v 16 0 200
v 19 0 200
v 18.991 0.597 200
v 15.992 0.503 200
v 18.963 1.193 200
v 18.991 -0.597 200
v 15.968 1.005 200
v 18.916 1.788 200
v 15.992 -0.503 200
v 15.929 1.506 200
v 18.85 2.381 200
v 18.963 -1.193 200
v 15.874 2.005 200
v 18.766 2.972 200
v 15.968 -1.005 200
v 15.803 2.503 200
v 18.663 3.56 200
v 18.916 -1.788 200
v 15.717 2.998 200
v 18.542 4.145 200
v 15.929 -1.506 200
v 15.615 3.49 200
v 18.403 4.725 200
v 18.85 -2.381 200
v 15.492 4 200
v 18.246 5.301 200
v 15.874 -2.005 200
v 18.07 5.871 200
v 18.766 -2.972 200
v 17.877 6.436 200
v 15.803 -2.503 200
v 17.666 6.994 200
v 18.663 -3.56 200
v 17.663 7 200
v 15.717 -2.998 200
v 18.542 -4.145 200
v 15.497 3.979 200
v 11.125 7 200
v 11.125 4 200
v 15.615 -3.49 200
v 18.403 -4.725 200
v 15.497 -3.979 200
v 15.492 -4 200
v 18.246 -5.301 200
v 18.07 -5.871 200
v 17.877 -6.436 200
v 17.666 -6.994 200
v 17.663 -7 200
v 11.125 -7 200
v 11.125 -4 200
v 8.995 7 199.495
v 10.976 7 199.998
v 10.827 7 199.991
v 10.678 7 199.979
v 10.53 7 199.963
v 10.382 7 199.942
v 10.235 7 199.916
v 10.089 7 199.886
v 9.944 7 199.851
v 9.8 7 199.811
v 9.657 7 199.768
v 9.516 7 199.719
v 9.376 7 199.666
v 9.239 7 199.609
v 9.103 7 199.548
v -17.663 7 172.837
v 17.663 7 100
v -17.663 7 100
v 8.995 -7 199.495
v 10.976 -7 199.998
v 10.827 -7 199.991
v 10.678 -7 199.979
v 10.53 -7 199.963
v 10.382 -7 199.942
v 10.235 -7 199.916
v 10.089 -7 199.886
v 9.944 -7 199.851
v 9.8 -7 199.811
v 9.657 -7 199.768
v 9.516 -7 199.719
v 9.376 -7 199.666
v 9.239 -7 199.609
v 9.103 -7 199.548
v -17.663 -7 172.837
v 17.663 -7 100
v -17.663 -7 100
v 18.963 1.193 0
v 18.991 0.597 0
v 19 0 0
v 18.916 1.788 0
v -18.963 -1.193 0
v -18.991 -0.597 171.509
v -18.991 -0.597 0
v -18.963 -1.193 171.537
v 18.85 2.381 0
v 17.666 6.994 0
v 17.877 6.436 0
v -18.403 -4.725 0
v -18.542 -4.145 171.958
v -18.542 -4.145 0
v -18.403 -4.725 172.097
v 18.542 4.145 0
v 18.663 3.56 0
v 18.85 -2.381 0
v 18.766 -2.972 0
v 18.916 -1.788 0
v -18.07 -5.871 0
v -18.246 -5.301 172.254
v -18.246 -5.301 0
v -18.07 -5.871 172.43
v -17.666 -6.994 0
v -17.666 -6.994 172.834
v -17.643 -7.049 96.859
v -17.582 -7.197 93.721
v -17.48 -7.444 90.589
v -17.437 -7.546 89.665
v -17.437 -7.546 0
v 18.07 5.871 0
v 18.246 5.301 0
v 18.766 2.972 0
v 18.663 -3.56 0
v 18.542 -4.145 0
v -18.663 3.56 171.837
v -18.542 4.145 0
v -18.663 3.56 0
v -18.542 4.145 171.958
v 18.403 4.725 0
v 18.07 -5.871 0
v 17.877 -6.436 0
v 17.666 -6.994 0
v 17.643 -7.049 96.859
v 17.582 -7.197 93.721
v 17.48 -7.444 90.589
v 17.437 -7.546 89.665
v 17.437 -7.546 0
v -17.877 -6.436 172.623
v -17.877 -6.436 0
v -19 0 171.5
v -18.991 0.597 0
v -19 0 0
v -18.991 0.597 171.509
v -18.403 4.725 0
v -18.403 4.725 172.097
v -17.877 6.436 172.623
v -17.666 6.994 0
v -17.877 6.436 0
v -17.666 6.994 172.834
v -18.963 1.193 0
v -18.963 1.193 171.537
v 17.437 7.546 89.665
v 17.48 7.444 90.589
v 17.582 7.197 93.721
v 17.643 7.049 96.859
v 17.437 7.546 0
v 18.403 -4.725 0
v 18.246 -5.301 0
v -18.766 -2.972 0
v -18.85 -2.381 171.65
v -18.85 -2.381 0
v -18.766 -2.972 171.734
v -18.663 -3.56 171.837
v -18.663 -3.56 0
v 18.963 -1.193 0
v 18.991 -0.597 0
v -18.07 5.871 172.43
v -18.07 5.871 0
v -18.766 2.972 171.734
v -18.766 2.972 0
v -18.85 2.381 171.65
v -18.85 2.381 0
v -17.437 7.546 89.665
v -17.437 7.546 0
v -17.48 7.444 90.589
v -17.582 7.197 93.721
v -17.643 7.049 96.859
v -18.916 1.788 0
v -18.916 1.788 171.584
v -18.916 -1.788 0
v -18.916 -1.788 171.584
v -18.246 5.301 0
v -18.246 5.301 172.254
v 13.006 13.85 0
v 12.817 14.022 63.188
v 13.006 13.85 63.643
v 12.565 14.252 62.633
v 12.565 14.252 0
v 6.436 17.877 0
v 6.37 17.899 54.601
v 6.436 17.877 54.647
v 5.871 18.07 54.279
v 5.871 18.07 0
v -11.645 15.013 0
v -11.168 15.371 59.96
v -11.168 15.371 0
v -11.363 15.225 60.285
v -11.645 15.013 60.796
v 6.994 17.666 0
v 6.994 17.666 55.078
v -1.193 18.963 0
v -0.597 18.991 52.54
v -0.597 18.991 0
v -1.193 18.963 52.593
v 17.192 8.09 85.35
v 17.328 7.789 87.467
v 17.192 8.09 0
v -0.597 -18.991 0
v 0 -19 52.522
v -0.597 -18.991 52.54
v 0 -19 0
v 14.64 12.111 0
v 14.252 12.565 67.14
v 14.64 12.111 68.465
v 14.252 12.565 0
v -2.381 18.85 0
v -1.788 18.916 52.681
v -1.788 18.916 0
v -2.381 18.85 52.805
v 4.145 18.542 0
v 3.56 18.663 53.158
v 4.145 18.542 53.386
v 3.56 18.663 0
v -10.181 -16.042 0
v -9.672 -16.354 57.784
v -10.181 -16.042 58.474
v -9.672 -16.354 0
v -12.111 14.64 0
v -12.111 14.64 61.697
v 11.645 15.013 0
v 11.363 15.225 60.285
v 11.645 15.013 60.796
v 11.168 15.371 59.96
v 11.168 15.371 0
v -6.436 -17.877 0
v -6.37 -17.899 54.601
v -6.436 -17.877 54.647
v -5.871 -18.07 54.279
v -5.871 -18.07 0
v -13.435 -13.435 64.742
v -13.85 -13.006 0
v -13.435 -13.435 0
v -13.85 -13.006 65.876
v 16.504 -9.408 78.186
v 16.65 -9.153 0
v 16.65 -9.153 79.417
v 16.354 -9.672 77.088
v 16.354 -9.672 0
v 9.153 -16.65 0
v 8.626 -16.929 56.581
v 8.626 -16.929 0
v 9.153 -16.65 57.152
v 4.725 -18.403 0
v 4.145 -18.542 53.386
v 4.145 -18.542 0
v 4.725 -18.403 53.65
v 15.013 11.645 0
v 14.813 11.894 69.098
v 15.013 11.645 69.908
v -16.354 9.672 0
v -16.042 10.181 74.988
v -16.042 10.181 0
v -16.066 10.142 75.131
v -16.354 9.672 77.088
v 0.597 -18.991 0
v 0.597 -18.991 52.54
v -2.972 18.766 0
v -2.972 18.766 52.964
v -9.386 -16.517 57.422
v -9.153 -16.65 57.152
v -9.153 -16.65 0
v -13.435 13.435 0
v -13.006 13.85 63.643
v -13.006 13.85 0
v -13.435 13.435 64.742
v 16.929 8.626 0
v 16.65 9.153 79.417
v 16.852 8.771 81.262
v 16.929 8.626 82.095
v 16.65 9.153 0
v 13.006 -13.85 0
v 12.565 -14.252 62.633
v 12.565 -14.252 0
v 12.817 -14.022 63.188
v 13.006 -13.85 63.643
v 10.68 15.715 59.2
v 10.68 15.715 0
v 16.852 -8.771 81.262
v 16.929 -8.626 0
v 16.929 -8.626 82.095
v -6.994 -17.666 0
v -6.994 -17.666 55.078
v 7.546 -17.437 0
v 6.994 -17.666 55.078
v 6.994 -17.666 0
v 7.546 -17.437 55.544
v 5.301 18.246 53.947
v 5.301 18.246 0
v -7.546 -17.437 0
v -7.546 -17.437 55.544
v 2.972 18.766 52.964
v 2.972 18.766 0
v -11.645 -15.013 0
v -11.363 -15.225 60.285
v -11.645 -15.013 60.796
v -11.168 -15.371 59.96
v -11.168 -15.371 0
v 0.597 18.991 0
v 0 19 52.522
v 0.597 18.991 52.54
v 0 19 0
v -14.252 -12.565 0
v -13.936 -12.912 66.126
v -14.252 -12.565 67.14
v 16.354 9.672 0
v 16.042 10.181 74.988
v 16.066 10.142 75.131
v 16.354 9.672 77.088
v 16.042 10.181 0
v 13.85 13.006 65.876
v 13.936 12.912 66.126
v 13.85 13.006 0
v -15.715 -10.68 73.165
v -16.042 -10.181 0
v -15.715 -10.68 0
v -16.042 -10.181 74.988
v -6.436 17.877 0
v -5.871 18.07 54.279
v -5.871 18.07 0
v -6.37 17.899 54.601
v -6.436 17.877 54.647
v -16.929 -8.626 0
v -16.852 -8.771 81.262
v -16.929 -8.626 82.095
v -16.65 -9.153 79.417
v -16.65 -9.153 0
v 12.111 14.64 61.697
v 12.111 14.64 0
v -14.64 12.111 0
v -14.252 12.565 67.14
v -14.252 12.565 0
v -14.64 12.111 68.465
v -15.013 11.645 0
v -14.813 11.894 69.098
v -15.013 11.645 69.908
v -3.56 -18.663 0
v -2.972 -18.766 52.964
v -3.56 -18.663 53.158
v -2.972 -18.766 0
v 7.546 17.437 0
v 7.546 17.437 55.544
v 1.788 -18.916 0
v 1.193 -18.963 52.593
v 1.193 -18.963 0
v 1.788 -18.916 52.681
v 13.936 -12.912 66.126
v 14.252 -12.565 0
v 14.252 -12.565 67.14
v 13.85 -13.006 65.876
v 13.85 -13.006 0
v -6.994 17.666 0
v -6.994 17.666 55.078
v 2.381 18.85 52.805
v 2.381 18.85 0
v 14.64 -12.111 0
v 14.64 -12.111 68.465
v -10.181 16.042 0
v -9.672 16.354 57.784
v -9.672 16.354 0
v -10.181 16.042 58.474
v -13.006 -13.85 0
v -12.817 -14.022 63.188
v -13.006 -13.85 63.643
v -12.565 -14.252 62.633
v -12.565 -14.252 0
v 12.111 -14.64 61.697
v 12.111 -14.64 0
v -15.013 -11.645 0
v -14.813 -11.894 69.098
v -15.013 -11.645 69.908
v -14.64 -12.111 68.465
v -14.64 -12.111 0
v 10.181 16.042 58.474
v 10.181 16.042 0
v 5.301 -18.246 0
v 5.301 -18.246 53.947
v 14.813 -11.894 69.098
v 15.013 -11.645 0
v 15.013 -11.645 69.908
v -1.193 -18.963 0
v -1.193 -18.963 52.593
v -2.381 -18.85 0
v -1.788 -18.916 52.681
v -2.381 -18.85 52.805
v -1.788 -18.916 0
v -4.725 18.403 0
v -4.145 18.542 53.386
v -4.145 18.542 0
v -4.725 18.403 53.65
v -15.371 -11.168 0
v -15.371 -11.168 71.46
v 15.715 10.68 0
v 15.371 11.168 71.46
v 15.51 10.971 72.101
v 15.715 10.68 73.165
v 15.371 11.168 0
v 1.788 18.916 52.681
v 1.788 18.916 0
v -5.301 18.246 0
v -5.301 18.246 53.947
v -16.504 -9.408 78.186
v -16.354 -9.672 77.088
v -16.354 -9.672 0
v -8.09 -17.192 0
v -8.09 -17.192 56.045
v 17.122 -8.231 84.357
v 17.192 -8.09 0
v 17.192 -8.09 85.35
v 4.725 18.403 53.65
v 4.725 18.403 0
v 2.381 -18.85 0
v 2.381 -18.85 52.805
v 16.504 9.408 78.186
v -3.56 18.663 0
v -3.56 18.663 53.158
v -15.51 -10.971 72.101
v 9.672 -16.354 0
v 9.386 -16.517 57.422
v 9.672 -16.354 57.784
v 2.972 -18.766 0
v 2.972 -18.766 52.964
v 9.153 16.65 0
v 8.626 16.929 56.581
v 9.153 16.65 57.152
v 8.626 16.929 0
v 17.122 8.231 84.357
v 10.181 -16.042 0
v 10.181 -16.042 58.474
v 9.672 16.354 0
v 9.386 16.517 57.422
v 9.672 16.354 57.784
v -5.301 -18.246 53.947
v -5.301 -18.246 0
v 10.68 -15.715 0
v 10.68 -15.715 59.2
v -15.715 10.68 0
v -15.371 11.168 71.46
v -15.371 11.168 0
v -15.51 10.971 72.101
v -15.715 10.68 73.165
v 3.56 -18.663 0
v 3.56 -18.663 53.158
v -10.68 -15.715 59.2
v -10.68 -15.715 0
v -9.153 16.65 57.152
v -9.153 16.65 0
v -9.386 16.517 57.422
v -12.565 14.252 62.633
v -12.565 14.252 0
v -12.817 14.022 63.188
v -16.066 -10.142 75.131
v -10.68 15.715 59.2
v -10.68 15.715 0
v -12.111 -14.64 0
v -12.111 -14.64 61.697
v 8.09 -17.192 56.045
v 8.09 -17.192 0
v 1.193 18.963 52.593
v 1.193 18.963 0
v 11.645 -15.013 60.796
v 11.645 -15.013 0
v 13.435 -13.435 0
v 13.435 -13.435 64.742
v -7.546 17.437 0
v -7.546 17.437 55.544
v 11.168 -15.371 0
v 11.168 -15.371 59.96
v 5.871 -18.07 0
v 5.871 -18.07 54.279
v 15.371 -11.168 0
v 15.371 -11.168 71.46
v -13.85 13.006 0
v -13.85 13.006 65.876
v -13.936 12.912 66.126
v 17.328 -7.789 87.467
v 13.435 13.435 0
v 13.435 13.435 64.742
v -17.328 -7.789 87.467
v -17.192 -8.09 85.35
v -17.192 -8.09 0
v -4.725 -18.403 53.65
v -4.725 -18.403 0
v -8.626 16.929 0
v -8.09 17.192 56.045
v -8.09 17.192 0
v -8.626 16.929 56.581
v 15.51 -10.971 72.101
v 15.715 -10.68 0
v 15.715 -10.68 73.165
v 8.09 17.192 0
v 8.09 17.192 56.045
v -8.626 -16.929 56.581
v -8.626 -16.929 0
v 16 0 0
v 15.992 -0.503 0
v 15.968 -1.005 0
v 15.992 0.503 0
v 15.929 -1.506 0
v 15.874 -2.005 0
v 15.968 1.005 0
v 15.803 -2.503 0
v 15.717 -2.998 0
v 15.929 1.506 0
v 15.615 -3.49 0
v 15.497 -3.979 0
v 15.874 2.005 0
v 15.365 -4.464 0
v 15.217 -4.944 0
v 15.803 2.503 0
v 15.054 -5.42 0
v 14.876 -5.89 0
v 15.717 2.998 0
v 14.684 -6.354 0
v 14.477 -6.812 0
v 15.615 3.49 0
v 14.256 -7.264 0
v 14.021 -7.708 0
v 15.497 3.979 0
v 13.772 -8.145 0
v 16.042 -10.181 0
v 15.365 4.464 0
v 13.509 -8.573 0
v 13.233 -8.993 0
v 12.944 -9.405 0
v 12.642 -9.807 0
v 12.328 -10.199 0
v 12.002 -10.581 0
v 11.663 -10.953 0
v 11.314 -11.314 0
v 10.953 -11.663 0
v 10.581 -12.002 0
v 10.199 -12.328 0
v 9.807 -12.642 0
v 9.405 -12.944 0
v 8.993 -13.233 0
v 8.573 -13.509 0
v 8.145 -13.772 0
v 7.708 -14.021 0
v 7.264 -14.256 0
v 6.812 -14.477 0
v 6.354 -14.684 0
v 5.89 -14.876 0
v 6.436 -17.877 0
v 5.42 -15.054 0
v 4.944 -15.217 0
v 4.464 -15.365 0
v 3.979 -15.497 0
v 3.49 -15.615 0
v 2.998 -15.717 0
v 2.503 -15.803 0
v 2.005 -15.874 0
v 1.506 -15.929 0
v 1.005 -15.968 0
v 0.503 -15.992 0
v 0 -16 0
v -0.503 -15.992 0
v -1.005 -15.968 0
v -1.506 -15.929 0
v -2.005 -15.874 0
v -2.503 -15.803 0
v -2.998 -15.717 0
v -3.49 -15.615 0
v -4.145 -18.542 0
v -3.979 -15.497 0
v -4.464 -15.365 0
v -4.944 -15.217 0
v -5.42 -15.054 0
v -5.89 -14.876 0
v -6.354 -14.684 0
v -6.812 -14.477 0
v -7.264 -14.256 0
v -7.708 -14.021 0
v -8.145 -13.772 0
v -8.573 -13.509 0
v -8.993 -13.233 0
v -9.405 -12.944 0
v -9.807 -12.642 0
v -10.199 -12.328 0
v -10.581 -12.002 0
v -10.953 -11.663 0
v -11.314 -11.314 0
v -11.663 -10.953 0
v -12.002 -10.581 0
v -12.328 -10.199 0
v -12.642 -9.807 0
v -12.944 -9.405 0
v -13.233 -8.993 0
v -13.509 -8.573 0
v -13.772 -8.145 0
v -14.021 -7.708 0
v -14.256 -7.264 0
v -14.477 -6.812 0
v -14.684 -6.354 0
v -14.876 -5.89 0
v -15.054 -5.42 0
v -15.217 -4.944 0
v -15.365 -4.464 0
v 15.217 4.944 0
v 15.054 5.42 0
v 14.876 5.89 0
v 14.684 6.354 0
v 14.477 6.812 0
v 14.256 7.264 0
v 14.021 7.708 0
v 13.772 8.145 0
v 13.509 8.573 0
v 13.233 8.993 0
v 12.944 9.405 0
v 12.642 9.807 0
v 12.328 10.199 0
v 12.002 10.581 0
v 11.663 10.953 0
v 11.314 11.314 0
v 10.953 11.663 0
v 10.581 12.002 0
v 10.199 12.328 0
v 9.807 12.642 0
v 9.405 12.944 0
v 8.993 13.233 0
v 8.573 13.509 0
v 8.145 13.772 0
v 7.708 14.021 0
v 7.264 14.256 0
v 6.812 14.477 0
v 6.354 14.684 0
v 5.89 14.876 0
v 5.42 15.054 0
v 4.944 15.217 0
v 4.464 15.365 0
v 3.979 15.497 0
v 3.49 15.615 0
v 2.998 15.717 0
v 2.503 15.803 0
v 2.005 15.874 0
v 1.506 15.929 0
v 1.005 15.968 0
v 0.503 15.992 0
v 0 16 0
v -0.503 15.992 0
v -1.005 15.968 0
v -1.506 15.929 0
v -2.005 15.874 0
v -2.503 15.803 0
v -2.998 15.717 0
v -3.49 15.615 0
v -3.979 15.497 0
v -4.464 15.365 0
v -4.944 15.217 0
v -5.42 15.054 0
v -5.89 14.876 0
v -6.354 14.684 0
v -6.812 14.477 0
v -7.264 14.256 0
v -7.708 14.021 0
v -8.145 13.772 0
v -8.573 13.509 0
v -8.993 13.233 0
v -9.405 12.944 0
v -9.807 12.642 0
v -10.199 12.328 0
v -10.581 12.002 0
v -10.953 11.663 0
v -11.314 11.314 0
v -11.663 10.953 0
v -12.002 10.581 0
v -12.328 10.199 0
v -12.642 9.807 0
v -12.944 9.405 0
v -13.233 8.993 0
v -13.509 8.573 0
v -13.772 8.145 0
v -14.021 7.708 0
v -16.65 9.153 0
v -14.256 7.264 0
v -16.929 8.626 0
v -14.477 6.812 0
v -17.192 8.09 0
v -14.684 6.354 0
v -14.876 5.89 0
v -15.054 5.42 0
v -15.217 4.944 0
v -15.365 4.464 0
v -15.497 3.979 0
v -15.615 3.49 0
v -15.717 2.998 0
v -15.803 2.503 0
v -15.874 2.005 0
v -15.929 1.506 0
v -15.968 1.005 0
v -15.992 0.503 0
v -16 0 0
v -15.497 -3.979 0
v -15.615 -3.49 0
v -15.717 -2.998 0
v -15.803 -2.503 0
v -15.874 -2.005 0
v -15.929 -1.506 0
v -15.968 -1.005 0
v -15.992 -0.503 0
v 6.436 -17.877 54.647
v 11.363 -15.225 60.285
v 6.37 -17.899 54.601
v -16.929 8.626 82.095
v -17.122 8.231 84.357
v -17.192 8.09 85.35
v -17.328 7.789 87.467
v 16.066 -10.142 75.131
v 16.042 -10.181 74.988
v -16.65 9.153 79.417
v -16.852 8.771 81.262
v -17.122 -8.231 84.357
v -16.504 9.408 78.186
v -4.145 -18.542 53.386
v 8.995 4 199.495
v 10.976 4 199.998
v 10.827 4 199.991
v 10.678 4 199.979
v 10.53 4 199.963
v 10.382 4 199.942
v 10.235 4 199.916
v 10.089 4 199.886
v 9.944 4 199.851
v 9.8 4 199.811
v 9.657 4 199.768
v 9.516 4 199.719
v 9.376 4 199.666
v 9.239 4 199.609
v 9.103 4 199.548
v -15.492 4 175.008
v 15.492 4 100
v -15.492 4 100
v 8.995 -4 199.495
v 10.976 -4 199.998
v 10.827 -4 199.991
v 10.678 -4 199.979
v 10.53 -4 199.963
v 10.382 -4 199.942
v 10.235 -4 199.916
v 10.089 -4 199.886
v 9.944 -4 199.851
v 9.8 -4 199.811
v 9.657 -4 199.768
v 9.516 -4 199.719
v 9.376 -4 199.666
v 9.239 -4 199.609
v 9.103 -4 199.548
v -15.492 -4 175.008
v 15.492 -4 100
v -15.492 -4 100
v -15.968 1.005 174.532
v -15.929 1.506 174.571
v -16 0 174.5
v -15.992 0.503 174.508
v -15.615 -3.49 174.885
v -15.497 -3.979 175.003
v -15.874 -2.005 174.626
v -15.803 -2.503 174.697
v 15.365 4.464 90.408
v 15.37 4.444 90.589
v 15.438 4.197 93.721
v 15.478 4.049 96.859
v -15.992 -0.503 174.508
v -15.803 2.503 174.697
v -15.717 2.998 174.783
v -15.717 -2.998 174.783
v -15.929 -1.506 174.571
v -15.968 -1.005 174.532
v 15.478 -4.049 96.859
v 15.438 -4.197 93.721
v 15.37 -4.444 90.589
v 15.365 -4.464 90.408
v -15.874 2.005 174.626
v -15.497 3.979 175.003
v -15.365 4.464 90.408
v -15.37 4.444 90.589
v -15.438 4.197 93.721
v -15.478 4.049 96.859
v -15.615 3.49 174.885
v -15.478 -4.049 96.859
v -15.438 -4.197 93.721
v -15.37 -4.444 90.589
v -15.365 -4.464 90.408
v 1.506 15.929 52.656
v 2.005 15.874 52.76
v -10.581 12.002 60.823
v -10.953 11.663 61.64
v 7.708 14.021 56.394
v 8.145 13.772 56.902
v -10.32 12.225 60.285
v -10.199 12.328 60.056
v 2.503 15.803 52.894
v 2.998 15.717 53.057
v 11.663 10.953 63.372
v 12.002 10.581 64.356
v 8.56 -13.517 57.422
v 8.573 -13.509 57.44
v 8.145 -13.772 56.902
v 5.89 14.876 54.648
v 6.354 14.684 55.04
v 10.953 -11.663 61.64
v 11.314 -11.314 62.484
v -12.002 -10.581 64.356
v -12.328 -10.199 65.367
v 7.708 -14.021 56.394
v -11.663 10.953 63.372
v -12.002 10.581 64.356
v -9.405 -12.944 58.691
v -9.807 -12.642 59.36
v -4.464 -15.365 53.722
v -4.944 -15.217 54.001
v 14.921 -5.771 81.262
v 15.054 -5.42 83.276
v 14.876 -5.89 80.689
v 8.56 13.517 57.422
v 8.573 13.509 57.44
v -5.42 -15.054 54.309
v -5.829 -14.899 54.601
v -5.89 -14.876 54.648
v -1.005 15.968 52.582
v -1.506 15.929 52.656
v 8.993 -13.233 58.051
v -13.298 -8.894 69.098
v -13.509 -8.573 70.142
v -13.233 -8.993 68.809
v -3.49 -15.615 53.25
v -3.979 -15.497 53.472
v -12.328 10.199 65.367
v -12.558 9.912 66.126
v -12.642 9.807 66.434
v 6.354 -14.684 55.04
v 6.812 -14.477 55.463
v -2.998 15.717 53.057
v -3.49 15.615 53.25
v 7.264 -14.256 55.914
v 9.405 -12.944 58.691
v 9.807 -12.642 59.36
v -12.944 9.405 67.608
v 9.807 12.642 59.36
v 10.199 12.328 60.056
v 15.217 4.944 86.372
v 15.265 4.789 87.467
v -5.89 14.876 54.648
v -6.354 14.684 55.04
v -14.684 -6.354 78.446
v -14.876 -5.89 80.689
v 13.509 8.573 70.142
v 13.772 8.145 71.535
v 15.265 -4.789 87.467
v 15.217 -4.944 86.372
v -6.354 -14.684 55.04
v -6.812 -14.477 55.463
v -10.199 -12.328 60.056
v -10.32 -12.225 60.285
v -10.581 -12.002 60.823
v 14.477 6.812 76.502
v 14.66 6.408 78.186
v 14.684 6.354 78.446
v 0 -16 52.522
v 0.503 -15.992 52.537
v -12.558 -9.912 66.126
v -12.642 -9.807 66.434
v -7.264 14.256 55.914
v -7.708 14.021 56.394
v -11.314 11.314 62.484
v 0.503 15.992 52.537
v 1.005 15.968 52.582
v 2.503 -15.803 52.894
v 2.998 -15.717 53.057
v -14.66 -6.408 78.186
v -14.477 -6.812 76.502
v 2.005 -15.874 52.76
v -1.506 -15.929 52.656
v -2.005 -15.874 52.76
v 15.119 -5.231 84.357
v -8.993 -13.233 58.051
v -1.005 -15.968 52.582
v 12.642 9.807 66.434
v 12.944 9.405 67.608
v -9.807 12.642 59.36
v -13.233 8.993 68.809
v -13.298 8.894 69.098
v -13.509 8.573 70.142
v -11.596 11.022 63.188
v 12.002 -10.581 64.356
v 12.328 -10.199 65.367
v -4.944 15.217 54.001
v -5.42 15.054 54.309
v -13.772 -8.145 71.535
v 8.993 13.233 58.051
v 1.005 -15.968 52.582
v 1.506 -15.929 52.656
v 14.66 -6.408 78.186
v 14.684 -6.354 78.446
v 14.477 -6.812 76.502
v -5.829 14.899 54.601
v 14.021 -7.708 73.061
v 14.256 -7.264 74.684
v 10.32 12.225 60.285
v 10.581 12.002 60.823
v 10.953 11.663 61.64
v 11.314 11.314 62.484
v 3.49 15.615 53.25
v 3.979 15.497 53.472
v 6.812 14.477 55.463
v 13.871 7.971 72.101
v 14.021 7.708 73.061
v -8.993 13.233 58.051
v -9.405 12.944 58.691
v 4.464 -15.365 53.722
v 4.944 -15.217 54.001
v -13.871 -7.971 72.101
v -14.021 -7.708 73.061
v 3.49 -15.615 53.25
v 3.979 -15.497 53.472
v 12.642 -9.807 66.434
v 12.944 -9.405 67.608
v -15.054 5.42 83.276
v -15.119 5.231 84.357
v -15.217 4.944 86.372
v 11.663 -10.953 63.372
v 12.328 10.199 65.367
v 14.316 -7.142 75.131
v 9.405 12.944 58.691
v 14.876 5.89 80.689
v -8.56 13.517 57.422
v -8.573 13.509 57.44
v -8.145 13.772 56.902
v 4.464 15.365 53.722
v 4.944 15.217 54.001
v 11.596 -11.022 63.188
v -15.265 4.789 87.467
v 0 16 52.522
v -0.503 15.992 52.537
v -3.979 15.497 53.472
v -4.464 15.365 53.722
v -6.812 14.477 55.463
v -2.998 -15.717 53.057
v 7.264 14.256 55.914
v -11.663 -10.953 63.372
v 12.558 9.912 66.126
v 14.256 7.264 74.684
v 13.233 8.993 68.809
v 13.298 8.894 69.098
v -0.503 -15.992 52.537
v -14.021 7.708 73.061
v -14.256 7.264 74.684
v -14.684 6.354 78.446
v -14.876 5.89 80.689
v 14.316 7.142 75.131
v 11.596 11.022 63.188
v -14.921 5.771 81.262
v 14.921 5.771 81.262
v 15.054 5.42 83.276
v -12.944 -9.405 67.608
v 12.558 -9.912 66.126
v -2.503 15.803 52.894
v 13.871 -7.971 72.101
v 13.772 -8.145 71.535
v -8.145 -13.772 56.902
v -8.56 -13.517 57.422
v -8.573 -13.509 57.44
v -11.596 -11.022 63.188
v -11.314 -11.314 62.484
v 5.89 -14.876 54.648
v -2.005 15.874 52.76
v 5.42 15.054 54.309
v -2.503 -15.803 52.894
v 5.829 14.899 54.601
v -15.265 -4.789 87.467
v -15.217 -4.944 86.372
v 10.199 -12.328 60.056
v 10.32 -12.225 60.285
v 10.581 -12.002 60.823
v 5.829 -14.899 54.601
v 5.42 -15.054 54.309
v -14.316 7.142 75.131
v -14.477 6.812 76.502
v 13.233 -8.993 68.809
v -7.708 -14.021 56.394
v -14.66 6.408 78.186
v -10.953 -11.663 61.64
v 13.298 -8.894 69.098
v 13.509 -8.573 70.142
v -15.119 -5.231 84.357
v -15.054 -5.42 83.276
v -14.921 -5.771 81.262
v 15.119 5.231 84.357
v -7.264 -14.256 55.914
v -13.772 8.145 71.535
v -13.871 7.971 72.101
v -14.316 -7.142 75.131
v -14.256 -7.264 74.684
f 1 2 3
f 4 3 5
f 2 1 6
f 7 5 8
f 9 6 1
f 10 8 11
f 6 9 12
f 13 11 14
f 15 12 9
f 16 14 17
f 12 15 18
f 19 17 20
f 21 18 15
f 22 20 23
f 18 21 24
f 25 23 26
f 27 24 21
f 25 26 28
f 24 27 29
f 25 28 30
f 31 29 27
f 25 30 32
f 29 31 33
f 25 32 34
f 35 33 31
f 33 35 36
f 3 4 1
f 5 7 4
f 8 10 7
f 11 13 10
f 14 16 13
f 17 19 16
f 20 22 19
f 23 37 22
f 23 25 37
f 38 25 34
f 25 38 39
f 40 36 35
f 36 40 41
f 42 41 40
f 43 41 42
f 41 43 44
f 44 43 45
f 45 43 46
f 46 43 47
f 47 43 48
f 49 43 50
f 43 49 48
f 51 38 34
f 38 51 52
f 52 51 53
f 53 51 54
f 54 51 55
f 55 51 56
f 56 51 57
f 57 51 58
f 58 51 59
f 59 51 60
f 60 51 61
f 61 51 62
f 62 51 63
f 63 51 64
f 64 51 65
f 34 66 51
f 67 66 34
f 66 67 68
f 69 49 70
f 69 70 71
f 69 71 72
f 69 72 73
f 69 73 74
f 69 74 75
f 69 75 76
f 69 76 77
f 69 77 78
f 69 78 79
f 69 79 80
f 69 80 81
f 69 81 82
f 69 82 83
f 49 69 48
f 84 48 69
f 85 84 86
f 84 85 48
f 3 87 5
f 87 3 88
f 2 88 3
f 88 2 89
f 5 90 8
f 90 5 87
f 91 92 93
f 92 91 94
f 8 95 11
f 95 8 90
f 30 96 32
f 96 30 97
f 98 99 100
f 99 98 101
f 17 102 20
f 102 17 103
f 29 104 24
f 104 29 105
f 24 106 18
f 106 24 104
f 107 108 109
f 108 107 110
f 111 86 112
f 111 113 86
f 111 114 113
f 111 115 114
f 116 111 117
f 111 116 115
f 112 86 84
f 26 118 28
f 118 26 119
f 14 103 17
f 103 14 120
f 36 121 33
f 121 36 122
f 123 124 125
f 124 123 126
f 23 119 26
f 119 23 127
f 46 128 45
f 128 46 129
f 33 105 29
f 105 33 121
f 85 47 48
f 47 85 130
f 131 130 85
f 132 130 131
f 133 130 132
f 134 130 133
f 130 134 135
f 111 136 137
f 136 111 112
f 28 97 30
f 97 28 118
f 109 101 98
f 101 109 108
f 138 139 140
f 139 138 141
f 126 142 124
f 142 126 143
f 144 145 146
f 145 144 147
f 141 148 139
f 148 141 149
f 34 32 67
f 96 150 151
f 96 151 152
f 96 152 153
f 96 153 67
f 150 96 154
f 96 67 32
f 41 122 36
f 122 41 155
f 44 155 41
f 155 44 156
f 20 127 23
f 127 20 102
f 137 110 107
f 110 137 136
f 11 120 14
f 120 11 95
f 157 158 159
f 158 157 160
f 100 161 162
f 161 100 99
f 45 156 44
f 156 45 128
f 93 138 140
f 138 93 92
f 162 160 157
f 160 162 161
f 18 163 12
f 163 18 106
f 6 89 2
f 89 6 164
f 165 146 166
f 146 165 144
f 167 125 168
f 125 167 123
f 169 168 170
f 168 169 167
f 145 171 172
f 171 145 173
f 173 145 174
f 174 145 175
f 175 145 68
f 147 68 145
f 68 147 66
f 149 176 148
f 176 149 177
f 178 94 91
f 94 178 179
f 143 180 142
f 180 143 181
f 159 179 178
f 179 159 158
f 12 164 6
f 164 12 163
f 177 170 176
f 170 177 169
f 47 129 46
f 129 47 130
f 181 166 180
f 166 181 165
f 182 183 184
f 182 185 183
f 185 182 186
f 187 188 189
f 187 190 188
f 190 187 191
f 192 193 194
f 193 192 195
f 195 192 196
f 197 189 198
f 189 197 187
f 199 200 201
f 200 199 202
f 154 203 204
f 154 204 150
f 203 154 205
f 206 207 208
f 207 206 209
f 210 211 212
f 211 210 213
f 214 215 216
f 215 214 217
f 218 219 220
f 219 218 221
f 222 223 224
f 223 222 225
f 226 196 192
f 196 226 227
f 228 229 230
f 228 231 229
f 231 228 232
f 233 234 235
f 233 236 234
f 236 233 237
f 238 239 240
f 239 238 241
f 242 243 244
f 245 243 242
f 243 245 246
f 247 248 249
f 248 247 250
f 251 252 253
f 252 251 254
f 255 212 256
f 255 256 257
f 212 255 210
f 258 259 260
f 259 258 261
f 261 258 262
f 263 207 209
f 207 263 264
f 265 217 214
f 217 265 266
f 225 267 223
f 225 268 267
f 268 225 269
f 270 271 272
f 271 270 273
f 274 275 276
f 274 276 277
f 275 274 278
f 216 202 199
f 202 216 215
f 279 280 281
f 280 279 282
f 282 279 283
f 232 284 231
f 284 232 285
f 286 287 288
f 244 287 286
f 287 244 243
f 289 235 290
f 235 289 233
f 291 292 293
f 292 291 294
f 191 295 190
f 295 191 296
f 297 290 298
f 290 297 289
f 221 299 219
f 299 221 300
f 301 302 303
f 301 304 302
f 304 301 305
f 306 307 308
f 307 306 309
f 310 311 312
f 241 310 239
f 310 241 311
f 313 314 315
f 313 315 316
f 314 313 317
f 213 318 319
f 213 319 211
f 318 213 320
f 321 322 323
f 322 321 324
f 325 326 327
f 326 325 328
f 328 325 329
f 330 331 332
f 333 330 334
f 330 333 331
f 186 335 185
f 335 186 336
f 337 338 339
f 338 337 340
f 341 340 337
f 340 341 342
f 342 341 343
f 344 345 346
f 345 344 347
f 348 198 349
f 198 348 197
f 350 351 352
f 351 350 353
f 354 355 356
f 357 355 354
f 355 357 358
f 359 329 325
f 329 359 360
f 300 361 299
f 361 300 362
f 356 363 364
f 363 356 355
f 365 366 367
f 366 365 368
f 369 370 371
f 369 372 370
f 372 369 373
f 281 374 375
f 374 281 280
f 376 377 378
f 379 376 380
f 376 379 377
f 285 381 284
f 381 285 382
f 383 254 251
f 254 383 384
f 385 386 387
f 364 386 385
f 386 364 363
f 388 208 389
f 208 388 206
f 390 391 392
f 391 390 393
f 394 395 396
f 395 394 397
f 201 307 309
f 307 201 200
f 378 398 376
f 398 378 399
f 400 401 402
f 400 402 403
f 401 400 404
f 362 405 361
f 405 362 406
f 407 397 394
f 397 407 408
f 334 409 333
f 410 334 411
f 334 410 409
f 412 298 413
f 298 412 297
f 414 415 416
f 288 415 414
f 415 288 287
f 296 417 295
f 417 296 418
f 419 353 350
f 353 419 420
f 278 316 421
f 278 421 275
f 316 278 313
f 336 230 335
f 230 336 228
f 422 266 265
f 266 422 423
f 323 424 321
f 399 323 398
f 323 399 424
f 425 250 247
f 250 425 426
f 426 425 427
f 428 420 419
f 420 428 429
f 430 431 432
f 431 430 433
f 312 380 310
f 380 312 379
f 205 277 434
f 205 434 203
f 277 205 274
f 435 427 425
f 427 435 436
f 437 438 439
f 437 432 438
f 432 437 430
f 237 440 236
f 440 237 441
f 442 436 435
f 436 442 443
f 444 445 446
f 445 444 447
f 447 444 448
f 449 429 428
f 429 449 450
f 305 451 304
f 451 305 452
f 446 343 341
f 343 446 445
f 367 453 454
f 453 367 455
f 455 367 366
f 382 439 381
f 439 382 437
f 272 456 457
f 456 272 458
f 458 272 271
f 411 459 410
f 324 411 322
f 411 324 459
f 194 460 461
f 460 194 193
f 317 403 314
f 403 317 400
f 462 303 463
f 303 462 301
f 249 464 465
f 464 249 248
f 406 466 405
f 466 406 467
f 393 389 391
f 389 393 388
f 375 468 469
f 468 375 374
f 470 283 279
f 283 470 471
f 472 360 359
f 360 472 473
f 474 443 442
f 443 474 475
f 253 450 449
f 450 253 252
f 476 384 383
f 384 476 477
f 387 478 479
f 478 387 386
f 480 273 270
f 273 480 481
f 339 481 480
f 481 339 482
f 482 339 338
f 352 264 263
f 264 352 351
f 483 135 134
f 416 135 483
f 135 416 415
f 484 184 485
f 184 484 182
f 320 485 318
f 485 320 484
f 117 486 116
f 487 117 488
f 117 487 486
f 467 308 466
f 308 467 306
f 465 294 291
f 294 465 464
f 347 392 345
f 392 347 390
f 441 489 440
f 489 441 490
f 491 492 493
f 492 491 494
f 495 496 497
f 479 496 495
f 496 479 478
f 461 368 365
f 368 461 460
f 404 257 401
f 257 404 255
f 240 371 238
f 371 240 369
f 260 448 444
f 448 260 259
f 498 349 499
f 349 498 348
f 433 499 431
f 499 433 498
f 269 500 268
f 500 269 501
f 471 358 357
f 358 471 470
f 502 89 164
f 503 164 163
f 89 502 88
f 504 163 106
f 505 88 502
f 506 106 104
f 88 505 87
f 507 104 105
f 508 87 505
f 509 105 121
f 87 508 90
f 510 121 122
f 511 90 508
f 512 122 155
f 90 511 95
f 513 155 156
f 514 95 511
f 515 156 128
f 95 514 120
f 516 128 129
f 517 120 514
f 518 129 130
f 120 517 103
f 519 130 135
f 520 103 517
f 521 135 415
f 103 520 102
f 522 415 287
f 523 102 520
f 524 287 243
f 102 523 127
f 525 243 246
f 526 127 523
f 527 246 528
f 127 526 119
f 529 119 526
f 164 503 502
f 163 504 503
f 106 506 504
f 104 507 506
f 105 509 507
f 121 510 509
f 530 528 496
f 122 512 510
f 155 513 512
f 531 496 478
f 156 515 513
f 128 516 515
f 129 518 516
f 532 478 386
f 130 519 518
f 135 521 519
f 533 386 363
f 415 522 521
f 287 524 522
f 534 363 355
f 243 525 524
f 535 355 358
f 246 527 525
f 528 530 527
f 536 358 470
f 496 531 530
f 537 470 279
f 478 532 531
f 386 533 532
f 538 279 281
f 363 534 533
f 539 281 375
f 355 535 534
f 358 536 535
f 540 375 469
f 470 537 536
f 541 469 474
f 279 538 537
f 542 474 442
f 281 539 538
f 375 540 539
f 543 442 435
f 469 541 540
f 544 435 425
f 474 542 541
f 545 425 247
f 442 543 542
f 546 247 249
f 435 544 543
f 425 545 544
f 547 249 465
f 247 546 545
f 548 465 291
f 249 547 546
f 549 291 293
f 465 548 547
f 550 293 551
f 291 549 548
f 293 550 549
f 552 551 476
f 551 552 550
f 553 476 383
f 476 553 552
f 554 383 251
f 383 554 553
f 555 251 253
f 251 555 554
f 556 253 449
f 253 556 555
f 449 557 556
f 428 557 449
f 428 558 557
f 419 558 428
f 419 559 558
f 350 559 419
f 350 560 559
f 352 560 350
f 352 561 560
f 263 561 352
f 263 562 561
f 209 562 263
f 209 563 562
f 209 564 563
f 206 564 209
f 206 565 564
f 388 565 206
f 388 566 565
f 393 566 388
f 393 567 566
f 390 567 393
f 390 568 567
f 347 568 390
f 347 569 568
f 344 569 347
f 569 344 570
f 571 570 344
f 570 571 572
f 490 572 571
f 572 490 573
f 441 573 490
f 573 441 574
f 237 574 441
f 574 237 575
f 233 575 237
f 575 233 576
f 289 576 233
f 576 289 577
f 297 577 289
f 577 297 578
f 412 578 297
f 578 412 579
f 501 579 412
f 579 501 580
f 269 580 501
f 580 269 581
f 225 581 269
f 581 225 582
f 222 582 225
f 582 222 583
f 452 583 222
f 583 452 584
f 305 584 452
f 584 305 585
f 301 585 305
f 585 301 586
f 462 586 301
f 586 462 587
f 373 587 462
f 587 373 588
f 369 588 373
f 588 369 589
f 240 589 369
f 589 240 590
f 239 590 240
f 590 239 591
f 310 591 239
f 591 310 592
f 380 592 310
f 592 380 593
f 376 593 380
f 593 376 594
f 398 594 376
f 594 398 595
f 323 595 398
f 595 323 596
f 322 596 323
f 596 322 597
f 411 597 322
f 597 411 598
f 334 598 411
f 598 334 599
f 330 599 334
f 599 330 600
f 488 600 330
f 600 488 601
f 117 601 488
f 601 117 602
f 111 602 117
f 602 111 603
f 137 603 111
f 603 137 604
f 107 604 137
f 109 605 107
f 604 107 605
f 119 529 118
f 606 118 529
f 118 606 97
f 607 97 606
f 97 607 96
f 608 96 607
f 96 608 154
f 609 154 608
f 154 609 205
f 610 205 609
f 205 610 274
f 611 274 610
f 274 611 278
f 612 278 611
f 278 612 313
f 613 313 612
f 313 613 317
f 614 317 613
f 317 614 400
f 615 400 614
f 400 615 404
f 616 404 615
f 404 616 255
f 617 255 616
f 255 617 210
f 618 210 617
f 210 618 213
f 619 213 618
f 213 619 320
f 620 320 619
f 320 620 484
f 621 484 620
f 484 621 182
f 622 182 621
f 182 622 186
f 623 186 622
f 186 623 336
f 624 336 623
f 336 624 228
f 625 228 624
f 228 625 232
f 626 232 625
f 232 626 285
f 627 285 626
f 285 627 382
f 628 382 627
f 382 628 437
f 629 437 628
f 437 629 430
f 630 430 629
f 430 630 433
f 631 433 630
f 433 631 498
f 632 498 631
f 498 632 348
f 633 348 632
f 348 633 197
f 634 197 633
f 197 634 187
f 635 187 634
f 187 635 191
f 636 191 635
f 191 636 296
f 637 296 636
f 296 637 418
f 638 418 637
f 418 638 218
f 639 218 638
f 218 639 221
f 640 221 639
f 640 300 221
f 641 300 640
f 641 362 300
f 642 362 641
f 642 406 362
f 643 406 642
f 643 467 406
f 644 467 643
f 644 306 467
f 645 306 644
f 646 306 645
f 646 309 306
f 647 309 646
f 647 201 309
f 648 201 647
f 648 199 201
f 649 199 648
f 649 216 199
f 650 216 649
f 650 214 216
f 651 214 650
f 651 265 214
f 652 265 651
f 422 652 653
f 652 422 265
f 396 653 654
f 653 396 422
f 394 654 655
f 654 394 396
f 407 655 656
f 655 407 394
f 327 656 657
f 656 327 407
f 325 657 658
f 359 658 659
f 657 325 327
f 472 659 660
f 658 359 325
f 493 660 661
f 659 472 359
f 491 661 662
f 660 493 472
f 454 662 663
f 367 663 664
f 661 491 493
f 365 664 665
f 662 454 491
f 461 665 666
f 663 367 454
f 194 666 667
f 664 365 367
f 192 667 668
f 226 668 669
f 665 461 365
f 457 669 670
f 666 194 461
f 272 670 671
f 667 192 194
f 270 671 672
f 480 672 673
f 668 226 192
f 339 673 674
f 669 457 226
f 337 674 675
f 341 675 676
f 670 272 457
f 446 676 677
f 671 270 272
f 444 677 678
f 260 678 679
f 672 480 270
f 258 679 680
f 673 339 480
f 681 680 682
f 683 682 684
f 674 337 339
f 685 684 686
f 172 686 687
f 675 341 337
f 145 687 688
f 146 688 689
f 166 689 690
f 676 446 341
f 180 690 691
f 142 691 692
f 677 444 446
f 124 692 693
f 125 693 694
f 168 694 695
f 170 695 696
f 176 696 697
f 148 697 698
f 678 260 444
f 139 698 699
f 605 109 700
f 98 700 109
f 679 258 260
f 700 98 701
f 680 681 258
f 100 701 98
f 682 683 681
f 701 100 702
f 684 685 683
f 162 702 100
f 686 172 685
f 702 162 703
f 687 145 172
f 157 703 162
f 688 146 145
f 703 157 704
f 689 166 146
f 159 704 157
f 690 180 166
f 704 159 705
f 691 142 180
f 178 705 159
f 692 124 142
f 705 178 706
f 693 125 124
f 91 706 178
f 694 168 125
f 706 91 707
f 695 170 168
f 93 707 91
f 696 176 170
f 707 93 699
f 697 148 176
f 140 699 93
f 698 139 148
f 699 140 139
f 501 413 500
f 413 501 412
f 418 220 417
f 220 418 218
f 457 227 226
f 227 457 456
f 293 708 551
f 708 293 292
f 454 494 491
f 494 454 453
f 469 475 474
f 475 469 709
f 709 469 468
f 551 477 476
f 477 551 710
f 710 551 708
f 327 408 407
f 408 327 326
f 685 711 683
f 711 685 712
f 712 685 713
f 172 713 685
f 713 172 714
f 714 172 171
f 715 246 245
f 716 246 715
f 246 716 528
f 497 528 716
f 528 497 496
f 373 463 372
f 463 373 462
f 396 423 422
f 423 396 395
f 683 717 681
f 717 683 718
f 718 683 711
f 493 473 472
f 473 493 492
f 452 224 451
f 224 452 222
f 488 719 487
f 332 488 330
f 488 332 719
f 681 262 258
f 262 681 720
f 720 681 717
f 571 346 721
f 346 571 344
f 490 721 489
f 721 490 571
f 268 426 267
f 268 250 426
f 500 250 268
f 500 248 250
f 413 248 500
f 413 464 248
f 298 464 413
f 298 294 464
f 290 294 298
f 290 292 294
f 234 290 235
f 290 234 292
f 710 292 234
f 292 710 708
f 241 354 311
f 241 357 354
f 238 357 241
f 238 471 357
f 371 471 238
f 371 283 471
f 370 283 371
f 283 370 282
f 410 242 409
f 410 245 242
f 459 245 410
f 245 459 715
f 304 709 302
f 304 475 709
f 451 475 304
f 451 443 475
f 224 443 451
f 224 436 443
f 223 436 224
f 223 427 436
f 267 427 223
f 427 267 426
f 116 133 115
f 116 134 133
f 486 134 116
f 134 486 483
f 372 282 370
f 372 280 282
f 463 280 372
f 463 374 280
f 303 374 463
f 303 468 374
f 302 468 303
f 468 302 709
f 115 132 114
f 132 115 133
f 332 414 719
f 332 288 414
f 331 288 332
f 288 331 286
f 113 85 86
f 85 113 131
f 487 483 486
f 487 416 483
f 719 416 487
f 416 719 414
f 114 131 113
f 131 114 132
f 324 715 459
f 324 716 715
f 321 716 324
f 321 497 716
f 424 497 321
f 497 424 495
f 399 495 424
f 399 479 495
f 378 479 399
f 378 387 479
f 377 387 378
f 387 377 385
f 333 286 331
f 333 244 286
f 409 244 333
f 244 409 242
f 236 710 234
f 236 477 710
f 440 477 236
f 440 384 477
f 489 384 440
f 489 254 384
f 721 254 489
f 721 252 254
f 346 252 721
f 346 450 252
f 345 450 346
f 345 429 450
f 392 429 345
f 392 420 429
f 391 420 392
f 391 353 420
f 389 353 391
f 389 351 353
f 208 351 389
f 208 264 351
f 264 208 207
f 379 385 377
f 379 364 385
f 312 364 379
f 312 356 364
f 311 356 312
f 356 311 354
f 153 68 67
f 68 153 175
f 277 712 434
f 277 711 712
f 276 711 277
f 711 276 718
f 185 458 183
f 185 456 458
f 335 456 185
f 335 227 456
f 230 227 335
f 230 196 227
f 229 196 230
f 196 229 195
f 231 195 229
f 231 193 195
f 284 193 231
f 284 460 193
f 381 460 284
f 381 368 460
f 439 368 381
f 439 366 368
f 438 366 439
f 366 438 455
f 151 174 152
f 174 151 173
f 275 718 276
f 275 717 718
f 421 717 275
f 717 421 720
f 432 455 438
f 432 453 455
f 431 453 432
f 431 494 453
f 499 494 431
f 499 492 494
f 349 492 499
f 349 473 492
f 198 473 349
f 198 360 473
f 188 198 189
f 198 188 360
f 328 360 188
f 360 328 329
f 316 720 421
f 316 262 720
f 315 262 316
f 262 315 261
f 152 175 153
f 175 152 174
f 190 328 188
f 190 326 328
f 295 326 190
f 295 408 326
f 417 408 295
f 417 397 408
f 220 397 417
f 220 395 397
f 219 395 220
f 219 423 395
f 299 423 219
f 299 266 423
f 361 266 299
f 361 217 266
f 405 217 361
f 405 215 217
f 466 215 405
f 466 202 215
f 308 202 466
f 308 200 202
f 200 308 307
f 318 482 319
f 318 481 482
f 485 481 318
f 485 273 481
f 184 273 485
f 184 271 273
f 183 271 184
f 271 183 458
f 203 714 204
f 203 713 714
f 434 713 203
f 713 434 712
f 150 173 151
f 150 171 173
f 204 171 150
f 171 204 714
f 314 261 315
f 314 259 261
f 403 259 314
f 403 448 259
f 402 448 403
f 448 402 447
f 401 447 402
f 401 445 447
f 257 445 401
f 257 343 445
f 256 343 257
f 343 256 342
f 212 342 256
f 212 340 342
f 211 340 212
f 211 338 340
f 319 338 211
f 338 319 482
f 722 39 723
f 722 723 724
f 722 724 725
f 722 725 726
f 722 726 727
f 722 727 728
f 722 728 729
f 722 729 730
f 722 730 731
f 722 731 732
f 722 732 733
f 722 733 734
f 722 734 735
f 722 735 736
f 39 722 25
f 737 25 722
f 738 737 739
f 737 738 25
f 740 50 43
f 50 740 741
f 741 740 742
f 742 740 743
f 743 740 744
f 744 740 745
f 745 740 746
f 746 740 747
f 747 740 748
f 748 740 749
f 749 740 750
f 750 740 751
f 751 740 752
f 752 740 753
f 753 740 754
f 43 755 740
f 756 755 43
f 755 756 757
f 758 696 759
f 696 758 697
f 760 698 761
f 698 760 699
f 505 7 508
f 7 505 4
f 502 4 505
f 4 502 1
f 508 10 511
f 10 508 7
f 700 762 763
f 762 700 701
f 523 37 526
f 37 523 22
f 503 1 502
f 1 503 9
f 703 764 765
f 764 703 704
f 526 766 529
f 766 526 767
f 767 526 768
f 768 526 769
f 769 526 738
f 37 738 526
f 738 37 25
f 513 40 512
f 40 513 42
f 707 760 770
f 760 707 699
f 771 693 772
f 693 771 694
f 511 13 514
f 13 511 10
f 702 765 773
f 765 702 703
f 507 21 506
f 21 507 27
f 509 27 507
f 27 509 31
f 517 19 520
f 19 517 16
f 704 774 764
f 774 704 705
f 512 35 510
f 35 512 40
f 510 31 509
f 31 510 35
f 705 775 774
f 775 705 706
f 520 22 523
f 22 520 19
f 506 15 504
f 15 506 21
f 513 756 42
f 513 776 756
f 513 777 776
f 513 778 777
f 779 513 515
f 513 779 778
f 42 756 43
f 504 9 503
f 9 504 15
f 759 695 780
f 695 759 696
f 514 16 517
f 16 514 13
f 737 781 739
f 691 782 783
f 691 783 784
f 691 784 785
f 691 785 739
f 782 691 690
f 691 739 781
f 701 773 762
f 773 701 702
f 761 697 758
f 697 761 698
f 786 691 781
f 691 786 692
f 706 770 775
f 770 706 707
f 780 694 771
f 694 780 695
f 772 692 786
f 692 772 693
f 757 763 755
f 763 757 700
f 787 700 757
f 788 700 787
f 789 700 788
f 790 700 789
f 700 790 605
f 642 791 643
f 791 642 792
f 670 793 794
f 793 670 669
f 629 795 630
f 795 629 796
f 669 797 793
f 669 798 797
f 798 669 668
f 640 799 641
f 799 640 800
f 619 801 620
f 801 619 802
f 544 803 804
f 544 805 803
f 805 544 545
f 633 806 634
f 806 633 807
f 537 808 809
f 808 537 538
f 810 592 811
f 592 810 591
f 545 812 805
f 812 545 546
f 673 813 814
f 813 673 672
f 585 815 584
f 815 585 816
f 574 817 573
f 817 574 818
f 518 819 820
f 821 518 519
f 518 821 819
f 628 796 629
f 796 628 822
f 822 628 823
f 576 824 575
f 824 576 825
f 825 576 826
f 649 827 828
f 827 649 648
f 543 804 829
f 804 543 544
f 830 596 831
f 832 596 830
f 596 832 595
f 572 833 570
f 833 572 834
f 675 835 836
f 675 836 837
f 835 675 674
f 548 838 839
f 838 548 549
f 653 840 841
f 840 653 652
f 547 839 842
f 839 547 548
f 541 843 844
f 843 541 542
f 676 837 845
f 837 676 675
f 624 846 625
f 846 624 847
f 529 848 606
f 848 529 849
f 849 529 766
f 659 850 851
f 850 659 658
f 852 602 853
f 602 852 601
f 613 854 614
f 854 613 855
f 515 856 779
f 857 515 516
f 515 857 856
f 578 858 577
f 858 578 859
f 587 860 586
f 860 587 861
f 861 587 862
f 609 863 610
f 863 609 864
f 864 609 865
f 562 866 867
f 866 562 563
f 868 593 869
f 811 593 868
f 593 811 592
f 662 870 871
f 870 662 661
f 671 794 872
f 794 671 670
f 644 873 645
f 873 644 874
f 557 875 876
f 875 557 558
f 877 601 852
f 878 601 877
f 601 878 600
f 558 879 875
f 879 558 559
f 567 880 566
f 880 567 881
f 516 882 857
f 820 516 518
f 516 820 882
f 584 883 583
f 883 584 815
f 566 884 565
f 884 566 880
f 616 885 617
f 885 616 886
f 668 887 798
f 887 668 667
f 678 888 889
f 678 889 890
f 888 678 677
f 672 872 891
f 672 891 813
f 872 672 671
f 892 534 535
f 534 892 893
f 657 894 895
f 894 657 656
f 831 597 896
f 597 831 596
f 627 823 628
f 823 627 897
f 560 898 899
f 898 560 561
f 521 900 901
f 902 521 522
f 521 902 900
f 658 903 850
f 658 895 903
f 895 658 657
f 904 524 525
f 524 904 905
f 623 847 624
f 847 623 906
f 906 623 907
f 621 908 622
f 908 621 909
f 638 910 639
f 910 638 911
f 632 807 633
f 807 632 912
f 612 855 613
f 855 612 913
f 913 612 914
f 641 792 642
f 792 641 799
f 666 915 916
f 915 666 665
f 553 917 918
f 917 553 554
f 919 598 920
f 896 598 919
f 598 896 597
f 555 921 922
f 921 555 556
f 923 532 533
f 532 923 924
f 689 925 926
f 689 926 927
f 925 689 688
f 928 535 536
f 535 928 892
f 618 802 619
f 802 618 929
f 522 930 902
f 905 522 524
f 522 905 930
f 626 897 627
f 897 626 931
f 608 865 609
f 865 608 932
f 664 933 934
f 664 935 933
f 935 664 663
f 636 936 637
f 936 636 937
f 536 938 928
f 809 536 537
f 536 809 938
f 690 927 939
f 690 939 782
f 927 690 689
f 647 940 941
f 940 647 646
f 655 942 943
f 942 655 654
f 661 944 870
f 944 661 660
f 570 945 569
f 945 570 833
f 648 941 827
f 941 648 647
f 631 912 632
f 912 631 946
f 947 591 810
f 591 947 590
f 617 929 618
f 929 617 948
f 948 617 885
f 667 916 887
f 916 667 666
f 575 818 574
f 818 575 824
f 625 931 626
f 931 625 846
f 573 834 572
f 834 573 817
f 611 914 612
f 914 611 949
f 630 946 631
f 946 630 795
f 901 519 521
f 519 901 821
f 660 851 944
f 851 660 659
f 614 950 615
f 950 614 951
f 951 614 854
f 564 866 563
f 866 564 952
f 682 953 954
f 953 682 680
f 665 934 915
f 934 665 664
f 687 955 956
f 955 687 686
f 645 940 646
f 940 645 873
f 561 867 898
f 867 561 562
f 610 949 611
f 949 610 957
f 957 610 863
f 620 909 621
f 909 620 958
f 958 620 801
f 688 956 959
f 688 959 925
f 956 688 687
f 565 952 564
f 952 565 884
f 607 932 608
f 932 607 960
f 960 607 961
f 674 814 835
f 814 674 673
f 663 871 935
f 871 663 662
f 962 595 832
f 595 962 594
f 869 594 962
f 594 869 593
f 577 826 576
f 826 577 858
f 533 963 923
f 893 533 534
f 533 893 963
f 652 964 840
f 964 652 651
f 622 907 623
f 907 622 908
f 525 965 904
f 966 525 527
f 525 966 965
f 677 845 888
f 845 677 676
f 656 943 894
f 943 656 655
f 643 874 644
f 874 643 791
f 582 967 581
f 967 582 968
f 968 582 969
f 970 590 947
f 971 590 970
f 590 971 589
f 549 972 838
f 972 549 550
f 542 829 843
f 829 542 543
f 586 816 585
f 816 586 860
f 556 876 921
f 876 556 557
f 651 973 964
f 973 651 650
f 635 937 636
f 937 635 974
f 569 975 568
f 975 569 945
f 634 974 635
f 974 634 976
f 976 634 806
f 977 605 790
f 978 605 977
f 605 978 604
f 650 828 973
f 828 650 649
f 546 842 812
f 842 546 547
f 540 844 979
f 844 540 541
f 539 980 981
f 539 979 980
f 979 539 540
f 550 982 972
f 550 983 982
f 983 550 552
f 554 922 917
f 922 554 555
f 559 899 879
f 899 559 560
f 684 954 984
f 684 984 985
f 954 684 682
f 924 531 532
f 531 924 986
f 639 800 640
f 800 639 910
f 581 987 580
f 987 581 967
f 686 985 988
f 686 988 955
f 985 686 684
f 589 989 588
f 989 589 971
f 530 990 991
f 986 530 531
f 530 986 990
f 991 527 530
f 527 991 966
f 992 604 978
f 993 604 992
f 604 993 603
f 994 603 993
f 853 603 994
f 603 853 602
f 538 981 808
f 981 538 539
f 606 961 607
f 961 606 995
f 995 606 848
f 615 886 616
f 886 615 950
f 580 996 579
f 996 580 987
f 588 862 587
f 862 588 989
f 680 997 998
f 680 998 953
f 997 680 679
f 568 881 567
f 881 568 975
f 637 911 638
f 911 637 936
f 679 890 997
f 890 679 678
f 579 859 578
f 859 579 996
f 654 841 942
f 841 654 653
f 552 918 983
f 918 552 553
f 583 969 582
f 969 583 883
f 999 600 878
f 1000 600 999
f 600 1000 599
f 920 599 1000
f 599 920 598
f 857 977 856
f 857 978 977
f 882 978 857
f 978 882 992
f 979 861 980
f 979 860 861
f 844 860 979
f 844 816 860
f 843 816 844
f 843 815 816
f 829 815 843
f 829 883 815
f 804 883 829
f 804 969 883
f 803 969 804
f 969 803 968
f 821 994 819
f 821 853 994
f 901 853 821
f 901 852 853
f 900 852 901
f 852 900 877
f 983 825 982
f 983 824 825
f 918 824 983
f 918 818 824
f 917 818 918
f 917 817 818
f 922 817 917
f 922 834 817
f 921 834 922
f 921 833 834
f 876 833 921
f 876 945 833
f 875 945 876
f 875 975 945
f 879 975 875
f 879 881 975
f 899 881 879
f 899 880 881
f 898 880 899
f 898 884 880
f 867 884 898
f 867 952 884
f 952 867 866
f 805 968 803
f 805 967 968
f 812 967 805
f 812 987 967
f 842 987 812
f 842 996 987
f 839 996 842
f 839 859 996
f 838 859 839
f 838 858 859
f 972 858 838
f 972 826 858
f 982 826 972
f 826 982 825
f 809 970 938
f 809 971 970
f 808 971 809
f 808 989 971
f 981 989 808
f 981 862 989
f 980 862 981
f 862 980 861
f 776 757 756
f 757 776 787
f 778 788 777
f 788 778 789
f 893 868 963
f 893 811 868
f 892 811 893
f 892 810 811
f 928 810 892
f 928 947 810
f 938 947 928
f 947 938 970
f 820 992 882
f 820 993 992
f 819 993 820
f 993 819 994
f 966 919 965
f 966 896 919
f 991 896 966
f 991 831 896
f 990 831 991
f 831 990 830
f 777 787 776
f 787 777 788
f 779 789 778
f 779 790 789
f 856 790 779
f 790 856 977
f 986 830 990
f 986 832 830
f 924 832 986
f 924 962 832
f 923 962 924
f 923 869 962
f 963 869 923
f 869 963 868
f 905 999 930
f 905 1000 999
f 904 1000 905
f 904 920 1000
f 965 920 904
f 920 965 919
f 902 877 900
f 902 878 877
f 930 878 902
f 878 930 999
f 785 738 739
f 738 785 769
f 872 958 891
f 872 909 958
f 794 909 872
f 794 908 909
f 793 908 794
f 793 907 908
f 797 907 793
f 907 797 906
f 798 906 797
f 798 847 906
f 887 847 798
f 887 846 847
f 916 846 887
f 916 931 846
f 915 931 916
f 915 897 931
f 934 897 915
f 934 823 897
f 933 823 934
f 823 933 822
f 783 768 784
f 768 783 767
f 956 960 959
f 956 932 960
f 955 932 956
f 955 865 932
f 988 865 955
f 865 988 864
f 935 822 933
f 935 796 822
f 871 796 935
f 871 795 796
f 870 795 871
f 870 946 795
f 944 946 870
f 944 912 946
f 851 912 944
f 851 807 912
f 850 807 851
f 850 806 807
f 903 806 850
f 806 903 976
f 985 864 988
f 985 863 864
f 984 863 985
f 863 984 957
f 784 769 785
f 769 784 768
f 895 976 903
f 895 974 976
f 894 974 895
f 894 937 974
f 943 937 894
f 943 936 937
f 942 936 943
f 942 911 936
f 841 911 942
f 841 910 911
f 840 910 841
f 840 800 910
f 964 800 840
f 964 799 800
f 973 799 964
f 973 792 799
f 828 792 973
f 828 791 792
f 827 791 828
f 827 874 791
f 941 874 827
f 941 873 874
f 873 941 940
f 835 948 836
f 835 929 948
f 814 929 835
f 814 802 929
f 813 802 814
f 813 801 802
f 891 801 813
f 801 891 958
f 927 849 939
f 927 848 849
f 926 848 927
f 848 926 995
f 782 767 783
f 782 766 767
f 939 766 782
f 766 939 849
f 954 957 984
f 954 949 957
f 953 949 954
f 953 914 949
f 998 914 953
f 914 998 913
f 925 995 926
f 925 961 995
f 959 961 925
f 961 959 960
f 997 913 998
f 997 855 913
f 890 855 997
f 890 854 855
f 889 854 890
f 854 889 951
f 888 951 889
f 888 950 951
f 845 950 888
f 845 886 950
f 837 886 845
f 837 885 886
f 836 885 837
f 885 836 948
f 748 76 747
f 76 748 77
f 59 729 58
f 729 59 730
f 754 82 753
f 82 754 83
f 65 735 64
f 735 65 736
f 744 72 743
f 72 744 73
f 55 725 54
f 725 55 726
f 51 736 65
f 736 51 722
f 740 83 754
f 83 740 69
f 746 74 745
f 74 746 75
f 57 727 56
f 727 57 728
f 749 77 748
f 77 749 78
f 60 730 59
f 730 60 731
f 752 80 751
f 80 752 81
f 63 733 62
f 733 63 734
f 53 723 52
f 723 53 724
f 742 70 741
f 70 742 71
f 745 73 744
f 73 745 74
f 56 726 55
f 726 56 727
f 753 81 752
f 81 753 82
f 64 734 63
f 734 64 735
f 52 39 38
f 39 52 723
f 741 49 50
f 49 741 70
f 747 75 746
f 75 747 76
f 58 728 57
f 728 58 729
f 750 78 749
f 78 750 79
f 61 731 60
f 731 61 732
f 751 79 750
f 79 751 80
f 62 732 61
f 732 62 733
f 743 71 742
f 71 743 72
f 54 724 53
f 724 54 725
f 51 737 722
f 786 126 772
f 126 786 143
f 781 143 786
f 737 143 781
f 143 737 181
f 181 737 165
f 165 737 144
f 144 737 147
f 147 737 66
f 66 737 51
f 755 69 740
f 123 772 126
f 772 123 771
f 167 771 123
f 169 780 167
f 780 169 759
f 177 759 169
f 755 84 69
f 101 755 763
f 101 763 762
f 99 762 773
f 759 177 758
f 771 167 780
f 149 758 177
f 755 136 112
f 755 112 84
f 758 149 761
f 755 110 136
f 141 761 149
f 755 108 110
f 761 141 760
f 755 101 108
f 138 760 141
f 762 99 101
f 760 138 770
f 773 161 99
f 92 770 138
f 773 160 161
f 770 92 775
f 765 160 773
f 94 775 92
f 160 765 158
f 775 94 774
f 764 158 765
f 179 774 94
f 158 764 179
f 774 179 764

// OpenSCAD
// How thick should the shaft be to fit your vaccuum?
shaft_diameter = 32; // [10:60]

// How wide should the tip of the nozzle open?
nozzle_opening = 8; // [1:20]

// How long should the crevice be in total?
crevice_length = 200; // [100:500]

// How thick should the walls of the nozzle be? (Thinner = less filament usage but more likely to break)
wall_thickness = 3; // [1:10]

module shape(rohrdurchmesser, duesenstaerke, laenge){
		
	difference(){		
		union(){
			cylinder(laenge/2, r=rohrdurchmesser/2);
			intersection(){
					translate([-rohrdurchmesser/2,-duesenstaerke/2,laenge/2]) 
						cube([rohrdurchmesser,duesenstaerke,laenge/2]);
					translate([0,0,laenge/2]) 
						cylinder(laenge/2, r=rohrdurchmesser/2);
			}
		}
		for(i = [[-rohrdurchmesser/2,-laenge/2-duesenstaerke/2,laenge/2],[-rohrdurchmesser/2,laenge/2+duesenstaerke/2,laenge/2]])			
			translate(i)
			rotate([0,90,0]) 
			cylinder(rohrdurchmesser, r=laenge/2);
	}
}

module fugenduese(rohrdurchmesser, duesenstaerke, laenge, wandstaerke){
$fn = 200;
blocklaenge = sqrt(pow((rohrdurchmesser+2*wandstaerke)*3/4,2)*2);
	difference(){
		shape(rohrdurchmesser+wandstaerke*2,duesenstaerke+wandstaerke*2,laenge); // duese erstellen

		translate([0,0,0]) shape(rohrdurchmesser,duesenstaerke,laenge); //duese aushoehlen

		translate ([(rohrdurchmesser+2*wandstaerke)/4,0,laenge])
	   rotate([0,-45,0]) translate([-blocklaenge,-(duesenstaerke+wandstaerke*2)/2-0.005,0]) cube([blocklaenge,duesenstaerke+wandstaerke*2+0.01,blocklaenge]); //im 45Grad Winkel abschneiden

		difference(){ 

			translate([(rohrdurchmesser+2*wandstaerke)/8+(rohrdurchmesser+2*wandstaerke)/16,-(duesenstaerke+2*wandstaerke)/2-0.005,laenge-(rohrdurchmesser+2*wandstaerke)/8/4+0.005]) cube([(rohrdurchmesser)/8, duesenstaerke+2*wandstaerke+0.01 ,(rohrdurchmesser+2*wandstaerke)/8/4+0.005]);

			translate([
(rohrdurchmesser+2*wandstaerke)/4+(((rohrdurchmesser)/8)-sqrt(pow((rohrdurchmesser+2*wandstaerke)/8,2))/2),
duesenstaerke/2+wandstaerke+0.01,
laenge-(rohrdurchmesser+2*wandstaerke)/8]) 
rotate([90,0,0]) cylinder(duesenstaerke+wandstaerke*2+0.02, r = (rohrdurchmesser+2*wandstaerke)/8);

		} // die Ecke der Schnittkante abrunden
	}


}

fugenduese(shaft_diameter,nozzle_opening,crevice_length,wall_thickness);
